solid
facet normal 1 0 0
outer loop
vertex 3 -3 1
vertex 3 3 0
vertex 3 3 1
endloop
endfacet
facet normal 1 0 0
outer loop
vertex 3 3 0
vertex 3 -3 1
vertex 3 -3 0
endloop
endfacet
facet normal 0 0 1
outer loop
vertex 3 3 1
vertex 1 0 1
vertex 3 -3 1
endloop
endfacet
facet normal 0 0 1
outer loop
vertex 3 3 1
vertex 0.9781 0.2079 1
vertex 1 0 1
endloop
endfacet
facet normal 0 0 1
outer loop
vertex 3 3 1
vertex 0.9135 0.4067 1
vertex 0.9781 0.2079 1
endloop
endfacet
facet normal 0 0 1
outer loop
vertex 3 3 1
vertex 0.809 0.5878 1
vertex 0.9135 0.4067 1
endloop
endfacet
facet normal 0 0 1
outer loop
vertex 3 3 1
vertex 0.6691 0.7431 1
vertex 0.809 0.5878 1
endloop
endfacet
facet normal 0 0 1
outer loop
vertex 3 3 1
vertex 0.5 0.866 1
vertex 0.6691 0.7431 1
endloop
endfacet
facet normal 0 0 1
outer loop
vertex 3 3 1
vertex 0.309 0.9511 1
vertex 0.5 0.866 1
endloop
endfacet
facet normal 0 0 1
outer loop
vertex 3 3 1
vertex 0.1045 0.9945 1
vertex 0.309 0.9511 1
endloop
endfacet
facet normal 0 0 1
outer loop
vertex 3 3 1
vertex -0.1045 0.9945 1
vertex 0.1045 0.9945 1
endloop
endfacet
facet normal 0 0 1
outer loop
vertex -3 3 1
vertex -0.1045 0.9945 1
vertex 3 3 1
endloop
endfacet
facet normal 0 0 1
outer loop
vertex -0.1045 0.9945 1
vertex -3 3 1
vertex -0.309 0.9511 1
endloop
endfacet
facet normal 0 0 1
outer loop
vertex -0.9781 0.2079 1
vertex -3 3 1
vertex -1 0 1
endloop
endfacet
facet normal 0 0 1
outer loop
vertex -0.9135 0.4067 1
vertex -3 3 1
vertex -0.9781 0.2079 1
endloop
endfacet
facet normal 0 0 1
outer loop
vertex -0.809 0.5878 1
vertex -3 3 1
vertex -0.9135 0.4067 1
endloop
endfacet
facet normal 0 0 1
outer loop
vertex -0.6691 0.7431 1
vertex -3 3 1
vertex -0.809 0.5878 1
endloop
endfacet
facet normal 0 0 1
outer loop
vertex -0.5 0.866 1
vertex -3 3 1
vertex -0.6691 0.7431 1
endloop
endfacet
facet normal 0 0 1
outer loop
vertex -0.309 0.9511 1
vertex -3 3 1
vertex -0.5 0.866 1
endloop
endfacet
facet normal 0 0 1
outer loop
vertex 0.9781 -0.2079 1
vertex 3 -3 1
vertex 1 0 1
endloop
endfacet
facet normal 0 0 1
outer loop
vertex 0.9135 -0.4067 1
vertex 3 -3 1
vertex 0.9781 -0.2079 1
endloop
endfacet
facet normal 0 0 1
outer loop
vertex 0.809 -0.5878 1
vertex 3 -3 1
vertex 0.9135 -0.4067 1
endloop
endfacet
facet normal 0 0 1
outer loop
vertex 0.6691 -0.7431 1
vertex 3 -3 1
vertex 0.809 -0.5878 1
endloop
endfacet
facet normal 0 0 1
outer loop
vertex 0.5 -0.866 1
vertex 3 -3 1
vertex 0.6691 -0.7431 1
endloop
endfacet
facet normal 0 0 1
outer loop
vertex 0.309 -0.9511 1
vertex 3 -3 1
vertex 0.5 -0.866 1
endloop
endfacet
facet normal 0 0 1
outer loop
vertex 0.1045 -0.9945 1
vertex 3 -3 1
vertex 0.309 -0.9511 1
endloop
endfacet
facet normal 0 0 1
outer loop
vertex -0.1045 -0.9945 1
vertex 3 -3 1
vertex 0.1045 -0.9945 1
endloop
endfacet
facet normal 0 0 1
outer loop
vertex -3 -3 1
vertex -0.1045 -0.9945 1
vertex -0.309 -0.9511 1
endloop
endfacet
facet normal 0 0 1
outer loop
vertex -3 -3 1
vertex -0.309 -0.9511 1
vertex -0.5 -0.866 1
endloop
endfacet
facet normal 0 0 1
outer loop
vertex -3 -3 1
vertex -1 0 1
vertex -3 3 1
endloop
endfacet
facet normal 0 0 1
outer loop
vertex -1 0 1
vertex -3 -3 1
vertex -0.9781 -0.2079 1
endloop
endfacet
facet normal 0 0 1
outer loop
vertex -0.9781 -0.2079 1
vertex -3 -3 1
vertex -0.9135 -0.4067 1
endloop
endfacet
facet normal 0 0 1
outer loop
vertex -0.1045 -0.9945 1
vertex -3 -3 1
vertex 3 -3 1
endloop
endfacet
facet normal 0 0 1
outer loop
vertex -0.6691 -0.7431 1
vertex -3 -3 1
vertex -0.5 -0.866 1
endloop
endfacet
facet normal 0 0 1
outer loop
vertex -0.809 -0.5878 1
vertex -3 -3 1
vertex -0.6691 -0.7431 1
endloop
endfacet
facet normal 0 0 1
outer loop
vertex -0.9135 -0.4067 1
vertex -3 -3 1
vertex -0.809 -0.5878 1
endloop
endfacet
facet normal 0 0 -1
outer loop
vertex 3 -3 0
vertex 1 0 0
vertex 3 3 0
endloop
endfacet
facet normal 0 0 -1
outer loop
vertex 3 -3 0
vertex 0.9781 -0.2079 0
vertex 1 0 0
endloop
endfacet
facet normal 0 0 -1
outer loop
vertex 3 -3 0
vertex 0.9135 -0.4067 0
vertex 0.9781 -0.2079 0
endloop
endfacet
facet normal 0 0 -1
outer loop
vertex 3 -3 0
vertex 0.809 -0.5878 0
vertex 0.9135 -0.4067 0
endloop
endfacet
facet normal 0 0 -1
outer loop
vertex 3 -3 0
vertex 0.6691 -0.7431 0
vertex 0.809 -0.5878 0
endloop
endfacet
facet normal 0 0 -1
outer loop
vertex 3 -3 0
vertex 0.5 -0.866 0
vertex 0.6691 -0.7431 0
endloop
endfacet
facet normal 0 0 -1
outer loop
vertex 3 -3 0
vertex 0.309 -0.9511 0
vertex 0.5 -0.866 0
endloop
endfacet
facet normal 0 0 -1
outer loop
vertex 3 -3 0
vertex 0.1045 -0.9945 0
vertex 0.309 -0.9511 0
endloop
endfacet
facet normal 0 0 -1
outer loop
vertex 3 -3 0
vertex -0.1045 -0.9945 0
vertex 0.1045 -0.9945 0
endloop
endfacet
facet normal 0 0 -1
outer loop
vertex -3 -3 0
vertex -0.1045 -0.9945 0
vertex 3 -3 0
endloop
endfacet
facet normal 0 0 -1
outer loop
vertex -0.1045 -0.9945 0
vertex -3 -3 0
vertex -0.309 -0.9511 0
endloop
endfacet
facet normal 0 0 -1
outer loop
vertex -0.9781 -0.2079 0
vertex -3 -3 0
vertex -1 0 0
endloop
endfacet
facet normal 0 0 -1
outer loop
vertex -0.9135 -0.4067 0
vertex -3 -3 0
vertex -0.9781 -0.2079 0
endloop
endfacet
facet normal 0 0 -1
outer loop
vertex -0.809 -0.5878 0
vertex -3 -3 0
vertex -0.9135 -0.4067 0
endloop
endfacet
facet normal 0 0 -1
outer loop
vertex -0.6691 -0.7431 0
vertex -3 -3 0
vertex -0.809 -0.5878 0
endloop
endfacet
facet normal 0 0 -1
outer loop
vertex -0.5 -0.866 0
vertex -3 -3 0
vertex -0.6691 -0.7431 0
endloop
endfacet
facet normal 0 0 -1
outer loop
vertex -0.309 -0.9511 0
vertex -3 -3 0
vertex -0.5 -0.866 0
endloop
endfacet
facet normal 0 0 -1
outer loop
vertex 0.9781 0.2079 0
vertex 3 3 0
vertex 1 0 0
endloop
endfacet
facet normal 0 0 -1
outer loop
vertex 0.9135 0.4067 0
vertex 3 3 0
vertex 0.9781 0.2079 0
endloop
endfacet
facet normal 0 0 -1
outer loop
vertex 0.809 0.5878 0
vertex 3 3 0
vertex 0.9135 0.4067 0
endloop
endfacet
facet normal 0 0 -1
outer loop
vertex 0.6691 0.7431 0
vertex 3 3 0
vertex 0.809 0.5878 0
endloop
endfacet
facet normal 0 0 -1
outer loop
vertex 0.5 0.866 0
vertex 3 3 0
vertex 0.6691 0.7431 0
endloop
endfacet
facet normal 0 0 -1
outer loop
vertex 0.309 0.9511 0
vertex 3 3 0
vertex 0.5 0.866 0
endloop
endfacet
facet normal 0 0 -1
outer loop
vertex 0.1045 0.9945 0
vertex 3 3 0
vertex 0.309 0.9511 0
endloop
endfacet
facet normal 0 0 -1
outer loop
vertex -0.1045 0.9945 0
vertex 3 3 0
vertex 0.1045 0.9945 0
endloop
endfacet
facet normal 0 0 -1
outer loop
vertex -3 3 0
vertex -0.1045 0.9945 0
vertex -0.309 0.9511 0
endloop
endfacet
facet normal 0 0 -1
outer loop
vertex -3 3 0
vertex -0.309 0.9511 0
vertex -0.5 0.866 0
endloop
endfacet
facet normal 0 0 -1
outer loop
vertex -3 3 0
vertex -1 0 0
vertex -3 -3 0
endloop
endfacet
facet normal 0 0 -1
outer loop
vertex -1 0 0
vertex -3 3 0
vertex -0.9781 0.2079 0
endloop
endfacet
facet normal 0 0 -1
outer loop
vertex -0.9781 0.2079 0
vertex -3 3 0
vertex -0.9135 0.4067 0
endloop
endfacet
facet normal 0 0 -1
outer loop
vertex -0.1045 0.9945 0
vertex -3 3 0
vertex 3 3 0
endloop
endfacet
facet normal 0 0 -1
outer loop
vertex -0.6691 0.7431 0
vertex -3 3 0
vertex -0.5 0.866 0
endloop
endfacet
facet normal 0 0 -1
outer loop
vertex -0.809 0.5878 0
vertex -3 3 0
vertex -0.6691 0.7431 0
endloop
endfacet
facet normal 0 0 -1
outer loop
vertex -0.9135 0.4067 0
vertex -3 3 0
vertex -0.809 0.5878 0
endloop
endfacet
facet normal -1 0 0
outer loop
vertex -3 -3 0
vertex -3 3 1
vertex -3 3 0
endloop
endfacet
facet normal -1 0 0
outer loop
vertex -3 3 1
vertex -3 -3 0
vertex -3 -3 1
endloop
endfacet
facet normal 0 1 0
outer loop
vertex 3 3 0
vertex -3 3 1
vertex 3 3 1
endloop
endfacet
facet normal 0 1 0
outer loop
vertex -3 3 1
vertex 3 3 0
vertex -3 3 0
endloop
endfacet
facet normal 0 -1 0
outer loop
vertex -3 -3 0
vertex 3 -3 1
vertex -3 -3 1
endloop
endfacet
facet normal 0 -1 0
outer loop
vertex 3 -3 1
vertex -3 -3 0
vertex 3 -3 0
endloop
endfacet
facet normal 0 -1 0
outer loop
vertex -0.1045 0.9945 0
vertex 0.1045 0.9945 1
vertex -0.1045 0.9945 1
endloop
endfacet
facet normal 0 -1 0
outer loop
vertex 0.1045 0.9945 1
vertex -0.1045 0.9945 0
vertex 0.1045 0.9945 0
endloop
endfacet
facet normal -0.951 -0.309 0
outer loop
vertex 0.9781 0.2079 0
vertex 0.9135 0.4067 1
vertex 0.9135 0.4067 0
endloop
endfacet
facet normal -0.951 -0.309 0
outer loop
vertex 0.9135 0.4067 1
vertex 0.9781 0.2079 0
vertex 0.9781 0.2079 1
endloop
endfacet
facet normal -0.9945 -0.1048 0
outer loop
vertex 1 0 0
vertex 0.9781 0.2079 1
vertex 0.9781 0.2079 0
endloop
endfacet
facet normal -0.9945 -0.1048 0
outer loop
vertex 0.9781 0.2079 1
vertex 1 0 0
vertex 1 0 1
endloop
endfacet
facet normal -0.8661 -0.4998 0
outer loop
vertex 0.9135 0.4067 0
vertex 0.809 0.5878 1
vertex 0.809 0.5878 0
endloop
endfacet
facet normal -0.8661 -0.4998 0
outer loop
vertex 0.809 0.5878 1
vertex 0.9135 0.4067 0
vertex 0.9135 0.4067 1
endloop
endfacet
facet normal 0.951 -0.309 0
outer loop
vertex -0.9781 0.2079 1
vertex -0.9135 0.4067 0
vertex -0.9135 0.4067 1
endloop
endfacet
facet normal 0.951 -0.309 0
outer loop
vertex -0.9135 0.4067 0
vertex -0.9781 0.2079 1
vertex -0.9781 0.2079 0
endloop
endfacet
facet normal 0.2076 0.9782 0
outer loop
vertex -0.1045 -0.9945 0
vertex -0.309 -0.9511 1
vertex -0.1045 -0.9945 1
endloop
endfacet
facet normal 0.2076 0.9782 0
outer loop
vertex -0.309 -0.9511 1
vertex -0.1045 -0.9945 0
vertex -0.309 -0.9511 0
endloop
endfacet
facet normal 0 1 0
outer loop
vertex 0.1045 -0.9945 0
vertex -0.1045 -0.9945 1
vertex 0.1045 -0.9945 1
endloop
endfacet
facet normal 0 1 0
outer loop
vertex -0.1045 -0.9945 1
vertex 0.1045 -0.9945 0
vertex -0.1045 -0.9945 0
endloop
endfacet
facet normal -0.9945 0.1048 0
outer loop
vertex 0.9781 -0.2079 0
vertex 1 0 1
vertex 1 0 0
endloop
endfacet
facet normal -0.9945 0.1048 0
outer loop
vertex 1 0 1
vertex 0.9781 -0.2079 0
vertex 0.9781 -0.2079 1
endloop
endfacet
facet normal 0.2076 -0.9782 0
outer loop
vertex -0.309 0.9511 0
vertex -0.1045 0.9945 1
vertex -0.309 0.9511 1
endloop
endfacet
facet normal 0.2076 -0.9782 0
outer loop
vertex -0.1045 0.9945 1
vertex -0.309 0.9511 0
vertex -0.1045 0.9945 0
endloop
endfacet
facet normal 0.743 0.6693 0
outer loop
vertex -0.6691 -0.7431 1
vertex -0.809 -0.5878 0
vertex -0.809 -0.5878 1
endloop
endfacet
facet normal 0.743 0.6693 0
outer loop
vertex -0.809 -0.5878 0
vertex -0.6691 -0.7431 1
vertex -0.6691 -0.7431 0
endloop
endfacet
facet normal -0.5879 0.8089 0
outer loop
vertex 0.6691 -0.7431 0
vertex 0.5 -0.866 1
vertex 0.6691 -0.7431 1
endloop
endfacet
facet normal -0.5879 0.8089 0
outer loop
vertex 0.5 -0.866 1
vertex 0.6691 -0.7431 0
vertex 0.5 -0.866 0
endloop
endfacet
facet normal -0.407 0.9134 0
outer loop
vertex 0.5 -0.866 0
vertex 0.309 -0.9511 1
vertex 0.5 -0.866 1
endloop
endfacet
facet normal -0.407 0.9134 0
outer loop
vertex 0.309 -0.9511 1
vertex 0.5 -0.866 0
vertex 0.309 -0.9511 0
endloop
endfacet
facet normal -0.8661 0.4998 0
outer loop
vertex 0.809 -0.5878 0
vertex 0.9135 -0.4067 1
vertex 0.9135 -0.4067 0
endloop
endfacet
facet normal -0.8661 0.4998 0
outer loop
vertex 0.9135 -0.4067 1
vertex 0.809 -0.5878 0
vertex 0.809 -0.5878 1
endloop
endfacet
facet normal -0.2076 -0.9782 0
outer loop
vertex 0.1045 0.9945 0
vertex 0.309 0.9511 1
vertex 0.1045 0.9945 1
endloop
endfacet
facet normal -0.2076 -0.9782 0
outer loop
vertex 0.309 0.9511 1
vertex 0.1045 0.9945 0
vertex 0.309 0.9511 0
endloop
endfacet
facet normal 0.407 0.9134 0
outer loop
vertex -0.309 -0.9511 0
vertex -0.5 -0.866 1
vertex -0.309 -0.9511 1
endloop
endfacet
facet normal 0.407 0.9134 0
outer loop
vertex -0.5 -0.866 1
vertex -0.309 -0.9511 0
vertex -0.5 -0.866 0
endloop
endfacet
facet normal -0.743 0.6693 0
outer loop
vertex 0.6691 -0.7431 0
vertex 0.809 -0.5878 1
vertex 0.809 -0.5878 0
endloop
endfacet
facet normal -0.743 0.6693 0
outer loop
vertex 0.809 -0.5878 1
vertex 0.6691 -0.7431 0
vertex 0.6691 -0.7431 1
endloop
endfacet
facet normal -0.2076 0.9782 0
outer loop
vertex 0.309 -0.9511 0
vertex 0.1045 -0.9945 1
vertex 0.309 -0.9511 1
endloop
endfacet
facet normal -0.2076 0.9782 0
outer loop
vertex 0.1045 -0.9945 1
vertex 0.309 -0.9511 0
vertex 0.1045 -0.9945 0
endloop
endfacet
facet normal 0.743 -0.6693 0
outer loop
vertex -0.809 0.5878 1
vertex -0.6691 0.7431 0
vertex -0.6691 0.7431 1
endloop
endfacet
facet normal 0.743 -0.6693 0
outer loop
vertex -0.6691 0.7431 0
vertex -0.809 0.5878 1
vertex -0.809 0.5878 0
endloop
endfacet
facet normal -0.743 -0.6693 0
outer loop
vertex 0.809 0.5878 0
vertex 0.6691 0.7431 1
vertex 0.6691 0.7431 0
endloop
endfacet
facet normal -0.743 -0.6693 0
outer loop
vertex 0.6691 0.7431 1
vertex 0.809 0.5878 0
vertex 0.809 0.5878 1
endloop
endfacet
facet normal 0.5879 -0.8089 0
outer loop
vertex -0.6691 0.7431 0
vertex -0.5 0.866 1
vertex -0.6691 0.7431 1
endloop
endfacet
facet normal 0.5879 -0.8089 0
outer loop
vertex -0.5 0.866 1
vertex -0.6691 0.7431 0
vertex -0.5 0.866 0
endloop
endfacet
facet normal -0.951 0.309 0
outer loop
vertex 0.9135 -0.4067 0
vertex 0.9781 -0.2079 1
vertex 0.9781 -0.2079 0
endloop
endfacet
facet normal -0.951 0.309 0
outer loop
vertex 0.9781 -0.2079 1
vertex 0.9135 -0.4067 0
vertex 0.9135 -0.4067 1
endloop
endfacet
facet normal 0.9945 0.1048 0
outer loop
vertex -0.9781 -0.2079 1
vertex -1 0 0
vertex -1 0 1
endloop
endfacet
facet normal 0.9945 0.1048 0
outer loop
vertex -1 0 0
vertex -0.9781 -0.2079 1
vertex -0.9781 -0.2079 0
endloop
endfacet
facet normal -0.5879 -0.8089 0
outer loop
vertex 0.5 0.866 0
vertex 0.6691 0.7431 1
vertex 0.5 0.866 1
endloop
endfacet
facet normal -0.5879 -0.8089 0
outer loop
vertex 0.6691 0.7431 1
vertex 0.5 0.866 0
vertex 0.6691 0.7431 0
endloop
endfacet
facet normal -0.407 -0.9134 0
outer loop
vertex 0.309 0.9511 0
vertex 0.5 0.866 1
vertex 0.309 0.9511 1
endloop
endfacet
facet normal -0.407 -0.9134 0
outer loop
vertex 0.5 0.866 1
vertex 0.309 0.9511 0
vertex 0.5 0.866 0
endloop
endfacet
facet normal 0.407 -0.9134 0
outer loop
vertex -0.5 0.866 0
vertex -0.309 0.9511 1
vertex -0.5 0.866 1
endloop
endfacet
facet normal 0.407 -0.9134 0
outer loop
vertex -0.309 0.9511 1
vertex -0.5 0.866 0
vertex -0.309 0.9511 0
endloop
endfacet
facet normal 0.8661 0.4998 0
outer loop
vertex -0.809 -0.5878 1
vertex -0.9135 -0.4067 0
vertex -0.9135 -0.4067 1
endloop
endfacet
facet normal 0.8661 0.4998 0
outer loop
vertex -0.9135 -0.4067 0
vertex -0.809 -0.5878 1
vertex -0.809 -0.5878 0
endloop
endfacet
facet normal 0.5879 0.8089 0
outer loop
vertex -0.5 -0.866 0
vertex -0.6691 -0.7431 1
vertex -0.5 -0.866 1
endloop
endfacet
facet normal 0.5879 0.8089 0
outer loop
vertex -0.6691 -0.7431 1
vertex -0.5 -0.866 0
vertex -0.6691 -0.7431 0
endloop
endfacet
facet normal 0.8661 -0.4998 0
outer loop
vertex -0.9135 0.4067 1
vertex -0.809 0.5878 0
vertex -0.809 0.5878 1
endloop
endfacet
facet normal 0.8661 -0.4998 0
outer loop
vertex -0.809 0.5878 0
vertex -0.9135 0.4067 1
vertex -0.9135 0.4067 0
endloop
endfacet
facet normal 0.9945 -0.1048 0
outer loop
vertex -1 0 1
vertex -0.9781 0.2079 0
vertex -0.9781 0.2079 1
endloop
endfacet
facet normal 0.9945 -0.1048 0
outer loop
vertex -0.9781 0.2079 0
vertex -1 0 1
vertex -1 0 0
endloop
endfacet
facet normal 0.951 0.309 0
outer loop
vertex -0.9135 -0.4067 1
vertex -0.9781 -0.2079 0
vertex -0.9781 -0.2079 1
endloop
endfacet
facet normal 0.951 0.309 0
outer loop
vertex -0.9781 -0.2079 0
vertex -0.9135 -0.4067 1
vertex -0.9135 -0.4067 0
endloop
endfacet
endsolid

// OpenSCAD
module plate(length, width, thickness) {
    difference() {
        cube([6,6,1]);
        translate([3, 3, 0]){
            cylinder(r=1, h=1, $fn = 30);
        }
    }
}

rotate(a=0, v=[0, 0, 1]) {
    translate([-3, -3, 0]) plate();
}
